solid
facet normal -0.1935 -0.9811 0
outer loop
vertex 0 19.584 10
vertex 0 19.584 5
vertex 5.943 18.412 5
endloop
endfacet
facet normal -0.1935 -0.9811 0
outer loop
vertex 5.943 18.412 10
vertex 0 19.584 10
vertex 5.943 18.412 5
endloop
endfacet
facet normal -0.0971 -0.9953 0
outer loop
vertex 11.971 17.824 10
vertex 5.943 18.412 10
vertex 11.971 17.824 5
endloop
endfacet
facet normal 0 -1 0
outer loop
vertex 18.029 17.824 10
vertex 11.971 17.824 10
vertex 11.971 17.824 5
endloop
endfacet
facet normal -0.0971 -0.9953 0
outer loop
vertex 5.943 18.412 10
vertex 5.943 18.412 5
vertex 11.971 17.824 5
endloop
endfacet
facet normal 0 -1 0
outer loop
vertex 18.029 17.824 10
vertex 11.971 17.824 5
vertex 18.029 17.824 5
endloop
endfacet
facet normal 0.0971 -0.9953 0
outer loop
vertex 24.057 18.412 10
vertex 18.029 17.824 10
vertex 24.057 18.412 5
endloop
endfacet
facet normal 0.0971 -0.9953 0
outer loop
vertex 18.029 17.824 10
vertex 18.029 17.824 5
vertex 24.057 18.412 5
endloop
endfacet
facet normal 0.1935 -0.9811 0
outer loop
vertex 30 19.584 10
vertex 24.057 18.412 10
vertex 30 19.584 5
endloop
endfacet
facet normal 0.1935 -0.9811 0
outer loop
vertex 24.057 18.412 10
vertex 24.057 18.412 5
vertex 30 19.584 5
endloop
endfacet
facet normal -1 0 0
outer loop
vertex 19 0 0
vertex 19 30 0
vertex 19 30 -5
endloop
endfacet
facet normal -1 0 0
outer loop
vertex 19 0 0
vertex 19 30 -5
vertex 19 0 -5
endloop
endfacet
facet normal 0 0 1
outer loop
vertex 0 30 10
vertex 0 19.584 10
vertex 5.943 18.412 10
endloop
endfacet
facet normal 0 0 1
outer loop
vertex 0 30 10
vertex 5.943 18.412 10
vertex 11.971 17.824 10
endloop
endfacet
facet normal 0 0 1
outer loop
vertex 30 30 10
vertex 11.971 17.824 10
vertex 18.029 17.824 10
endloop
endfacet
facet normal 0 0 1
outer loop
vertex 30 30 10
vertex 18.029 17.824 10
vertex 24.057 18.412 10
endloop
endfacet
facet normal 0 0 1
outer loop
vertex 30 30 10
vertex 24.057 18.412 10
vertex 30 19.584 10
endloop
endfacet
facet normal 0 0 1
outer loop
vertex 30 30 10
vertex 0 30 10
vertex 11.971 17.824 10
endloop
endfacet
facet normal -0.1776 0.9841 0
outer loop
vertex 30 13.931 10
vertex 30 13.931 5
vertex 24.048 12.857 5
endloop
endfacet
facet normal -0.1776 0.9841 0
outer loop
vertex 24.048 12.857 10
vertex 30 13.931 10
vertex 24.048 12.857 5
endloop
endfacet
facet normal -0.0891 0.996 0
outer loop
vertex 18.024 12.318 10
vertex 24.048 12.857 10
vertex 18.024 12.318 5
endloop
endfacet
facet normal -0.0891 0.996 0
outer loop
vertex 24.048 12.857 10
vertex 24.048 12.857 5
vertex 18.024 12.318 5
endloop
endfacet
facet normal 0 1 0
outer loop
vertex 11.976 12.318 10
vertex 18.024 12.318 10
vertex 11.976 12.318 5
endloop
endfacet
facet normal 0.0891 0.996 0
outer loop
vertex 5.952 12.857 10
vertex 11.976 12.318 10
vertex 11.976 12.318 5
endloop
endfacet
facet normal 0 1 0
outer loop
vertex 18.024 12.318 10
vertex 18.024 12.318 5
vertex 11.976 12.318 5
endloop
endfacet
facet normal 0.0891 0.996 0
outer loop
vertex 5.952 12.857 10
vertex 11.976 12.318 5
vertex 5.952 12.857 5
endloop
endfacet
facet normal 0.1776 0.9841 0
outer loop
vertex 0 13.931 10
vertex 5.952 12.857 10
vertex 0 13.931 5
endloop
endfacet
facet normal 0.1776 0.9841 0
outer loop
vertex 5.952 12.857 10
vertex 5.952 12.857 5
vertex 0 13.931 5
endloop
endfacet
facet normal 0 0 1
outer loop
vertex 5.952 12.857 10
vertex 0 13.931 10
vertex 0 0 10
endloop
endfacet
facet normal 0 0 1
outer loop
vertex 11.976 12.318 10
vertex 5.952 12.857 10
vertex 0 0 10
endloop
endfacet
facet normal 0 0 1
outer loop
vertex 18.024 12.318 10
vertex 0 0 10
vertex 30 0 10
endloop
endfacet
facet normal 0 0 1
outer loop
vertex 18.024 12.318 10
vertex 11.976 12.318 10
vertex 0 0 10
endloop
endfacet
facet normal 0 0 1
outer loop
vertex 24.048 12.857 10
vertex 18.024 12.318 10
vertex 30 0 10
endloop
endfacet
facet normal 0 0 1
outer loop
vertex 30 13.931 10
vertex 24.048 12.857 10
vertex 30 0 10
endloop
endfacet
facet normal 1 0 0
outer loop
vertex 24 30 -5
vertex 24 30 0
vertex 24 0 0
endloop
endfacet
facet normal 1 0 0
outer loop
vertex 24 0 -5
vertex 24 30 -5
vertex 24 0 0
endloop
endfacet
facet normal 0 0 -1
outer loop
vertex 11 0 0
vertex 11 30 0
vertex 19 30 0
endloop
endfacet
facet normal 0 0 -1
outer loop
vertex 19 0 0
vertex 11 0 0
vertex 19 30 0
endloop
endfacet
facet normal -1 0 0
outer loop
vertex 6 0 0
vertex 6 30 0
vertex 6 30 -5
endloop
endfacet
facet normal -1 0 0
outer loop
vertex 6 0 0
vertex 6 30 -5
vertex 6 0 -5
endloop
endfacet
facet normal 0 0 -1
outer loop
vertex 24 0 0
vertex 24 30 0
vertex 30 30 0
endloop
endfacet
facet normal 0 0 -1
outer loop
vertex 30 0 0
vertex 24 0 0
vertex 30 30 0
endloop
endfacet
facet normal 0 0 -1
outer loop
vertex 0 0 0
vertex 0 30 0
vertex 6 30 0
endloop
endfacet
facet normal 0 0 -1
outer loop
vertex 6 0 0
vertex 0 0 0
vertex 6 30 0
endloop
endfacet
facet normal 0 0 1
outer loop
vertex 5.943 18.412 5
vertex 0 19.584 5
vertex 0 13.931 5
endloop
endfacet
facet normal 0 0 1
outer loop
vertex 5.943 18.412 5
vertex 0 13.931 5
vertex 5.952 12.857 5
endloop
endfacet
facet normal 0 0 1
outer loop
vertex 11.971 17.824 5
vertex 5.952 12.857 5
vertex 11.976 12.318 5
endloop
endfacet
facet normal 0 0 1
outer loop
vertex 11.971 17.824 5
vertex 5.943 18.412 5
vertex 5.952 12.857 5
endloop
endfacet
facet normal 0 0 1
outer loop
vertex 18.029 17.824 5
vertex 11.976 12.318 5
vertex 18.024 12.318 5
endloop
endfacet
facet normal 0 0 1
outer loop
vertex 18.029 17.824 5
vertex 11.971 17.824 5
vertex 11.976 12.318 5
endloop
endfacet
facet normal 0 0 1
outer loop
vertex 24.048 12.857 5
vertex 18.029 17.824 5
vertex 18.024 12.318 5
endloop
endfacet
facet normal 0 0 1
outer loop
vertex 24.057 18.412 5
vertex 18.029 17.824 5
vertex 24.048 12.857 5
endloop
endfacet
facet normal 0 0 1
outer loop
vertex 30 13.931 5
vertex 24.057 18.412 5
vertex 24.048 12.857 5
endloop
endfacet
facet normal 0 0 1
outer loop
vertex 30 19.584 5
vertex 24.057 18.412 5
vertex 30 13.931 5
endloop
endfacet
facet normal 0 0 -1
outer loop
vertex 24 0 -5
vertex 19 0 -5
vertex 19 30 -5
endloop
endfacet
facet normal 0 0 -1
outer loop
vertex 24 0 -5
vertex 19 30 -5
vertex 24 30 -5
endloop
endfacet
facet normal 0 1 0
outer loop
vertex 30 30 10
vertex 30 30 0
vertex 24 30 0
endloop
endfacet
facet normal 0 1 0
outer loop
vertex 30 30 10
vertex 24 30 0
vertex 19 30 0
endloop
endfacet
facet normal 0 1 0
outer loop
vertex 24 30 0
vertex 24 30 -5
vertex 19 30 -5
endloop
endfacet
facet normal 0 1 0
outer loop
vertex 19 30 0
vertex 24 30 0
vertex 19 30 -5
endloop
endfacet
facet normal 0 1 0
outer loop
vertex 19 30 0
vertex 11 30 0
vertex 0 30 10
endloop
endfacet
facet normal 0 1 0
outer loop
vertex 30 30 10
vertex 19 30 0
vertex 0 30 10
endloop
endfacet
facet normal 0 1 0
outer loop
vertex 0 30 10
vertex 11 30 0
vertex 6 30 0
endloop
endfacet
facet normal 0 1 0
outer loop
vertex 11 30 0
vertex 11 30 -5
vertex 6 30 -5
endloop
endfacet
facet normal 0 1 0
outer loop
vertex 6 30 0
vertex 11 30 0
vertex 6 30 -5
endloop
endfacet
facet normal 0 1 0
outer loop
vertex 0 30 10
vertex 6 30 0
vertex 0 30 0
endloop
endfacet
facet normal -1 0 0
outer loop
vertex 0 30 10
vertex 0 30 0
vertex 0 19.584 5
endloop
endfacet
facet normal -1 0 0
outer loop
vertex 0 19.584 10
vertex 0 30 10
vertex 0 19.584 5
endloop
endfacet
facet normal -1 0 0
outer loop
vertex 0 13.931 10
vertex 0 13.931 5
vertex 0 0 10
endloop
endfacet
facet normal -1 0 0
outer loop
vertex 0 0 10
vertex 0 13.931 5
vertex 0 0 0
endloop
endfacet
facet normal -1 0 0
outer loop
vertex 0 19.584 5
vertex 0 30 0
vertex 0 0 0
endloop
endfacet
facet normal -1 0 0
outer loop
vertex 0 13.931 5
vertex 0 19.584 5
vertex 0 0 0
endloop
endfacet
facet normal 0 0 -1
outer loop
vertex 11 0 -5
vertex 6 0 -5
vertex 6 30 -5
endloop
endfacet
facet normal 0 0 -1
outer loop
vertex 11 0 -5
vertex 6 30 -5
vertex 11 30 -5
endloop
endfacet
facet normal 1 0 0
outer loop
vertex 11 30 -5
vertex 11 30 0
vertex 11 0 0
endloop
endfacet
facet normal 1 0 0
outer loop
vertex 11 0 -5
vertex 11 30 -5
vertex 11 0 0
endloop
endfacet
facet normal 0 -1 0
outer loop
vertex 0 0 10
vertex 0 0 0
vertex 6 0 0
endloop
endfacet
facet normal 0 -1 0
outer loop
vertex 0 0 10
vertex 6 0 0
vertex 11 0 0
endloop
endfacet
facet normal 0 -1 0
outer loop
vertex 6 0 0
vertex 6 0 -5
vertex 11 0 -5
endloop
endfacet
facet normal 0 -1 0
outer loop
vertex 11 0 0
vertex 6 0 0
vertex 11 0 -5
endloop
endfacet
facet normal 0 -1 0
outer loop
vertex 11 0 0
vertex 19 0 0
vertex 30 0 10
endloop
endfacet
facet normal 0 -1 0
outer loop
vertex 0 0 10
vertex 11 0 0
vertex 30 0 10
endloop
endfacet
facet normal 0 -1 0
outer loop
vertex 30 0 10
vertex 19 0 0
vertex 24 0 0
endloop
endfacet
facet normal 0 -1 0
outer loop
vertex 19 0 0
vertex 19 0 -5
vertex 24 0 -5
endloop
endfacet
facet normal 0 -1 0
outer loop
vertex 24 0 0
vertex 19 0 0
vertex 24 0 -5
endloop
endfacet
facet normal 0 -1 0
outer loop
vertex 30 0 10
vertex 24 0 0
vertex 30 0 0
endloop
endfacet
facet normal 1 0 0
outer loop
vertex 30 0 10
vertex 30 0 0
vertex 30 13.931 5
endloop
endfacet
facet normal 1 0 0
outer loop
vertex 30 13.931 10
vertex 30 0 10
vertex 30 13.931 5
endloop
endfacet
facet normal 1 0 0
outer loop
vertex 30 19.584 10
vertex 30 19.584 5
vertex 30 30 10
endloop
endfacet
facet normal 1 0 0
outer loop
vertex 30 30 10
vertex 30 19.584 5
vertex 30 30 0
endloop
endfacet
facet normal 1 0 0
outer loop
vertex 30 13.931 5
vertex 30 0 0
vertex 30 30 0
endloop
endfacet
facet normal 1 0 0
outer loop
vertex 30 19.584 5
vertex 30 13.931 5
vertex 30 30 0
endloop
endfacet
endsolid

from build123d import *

# Parameters (mm, degrees)
F0_W     = 30
F0_H     = 30
F1_DEPTH = 5
F3_DEPTH = 5
F4_W     = 5
F4_H     = 30
F5_DEPTH = 5


with BuildPart() as f1:
    # F0 (on Top) → F1 (new body)
    with BuildSketch(Plane.XY):
        with Locations((15, 15)):
            Rectangle(F0_W, F0_H)
    extrude(amount=F1_DEPTH)

    # F2 (on face) → F3 (join)
    with BuildSketch(Plane.XY.offset(5)):
        with BuildLine():
            Line((0, 30), (0, 19.584253))
            ThreePointArc((0, 19.584253), (15, 17.75), (30, 19.584253))
            Line((30, 19.584253), (30, 30))
            Line((30, 30), (0, 30))
        make_face()
        with BuildLine():
            Line((30, 0), (30, 13.93138))
            ThreePointArc((30, 13.93138), (15, 12.25), (0, 13.93138))
            Line((0, 13.93138), (0, 0))
            Line((0, 0), (30, 0))
        make_face()
    extrude(amount=F3_DEPTH)

    # F4 (on face) → F5 (join)
    with BuildSketch(Plane(origin=(0, 0, 0), x_dir=(1, 0, 0), z_dir=(0, 0, -1))):
        with Locations((8.5, -15)):
            Rectangle(F4_W, F4_H)
        with Locations((21.5, -15)):
            Rectangle(F4_W, F4_H)
    extrude(amount=F5_DEPTH)


solid = f1.part
